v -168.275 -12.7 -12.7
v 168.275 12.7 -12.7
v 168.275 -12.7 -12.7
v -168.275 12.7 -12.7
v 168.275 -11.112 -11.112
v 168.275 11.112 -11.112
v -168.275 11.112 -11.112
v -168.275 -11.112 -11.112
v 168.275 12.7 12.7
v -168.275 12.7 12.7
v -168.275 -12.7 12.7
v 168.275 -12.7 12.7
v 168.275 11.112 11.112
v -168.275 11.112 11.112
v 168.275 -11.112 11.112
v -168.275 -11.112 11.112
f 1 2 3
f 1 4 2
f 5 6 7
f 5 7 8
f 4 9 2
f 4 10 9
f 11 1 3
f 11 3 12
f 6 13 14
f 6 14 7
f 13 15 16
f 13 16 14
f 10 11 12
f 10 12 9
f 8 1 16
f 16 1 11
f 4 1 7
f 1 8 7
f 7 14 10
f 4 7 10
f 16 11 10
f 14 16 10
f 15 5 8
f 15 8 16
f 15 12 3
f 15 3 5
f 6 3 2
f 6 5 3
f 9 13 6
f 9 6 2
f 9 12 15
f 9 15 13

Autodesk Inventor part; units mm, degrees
ref_plane "YZ Plane" through (0, 0, 0) normal (1, 0, 0) x (0, 1, 0)
ref_plane "XZ Plane" through (0, 0, 0) normal (0, 1, 0) x (-1, 0, 0)
ref_plane "XY Plane" through (0, 0, 0) normal (0, 0, 1) x (1, 0, 0)
sketch "Sketch1" plane through (0, 0, 0) normal (1, 0, 0) x (0, 1, 0)
  line L0 (-12.7, 12.7) -> (12.7, 12.7)
  line L1 (12.7, 12.7) -> (12.7, -12.7)
  line L2 (12.7, -12.7) -> (-12.7, -12.7)
  line L3 (-12.7, -12.7) -> (-12.7, 12.7)
  line L4 (-12.7, 12.7) -> (12.7, -12.7) construction
  line L5 (12.7, 12.7) -> (-12.7, -12.7) construction
  line L6 (-11.1125, 11.1125) -> (11.1125, 11.1125)
  line L7 (11.1125, 11.1125) -> (11.1125, -11.1125)
  line L8 (11.1125, -11.1125) -> (-11.1125, -11.1125)
  line L9 (-11.1125, -11.1125) -> (-11.1125, 11.1125)
  line L10 (-11.1125, 11.1125) -> (11.1125, -11.1125) construction
  line L11 (11.1125, 11.1125) -> (-11.1125, -11.1125) construction
  point P0 (0, 0)
  dimension "d0" = 25.4
  dimension "d1" = 1.5875
extrude "Extrusion1" add sketch "Sketch1" along normal mid plane 336.55
properties part number "cross brace" material "Aluminum 6061"
